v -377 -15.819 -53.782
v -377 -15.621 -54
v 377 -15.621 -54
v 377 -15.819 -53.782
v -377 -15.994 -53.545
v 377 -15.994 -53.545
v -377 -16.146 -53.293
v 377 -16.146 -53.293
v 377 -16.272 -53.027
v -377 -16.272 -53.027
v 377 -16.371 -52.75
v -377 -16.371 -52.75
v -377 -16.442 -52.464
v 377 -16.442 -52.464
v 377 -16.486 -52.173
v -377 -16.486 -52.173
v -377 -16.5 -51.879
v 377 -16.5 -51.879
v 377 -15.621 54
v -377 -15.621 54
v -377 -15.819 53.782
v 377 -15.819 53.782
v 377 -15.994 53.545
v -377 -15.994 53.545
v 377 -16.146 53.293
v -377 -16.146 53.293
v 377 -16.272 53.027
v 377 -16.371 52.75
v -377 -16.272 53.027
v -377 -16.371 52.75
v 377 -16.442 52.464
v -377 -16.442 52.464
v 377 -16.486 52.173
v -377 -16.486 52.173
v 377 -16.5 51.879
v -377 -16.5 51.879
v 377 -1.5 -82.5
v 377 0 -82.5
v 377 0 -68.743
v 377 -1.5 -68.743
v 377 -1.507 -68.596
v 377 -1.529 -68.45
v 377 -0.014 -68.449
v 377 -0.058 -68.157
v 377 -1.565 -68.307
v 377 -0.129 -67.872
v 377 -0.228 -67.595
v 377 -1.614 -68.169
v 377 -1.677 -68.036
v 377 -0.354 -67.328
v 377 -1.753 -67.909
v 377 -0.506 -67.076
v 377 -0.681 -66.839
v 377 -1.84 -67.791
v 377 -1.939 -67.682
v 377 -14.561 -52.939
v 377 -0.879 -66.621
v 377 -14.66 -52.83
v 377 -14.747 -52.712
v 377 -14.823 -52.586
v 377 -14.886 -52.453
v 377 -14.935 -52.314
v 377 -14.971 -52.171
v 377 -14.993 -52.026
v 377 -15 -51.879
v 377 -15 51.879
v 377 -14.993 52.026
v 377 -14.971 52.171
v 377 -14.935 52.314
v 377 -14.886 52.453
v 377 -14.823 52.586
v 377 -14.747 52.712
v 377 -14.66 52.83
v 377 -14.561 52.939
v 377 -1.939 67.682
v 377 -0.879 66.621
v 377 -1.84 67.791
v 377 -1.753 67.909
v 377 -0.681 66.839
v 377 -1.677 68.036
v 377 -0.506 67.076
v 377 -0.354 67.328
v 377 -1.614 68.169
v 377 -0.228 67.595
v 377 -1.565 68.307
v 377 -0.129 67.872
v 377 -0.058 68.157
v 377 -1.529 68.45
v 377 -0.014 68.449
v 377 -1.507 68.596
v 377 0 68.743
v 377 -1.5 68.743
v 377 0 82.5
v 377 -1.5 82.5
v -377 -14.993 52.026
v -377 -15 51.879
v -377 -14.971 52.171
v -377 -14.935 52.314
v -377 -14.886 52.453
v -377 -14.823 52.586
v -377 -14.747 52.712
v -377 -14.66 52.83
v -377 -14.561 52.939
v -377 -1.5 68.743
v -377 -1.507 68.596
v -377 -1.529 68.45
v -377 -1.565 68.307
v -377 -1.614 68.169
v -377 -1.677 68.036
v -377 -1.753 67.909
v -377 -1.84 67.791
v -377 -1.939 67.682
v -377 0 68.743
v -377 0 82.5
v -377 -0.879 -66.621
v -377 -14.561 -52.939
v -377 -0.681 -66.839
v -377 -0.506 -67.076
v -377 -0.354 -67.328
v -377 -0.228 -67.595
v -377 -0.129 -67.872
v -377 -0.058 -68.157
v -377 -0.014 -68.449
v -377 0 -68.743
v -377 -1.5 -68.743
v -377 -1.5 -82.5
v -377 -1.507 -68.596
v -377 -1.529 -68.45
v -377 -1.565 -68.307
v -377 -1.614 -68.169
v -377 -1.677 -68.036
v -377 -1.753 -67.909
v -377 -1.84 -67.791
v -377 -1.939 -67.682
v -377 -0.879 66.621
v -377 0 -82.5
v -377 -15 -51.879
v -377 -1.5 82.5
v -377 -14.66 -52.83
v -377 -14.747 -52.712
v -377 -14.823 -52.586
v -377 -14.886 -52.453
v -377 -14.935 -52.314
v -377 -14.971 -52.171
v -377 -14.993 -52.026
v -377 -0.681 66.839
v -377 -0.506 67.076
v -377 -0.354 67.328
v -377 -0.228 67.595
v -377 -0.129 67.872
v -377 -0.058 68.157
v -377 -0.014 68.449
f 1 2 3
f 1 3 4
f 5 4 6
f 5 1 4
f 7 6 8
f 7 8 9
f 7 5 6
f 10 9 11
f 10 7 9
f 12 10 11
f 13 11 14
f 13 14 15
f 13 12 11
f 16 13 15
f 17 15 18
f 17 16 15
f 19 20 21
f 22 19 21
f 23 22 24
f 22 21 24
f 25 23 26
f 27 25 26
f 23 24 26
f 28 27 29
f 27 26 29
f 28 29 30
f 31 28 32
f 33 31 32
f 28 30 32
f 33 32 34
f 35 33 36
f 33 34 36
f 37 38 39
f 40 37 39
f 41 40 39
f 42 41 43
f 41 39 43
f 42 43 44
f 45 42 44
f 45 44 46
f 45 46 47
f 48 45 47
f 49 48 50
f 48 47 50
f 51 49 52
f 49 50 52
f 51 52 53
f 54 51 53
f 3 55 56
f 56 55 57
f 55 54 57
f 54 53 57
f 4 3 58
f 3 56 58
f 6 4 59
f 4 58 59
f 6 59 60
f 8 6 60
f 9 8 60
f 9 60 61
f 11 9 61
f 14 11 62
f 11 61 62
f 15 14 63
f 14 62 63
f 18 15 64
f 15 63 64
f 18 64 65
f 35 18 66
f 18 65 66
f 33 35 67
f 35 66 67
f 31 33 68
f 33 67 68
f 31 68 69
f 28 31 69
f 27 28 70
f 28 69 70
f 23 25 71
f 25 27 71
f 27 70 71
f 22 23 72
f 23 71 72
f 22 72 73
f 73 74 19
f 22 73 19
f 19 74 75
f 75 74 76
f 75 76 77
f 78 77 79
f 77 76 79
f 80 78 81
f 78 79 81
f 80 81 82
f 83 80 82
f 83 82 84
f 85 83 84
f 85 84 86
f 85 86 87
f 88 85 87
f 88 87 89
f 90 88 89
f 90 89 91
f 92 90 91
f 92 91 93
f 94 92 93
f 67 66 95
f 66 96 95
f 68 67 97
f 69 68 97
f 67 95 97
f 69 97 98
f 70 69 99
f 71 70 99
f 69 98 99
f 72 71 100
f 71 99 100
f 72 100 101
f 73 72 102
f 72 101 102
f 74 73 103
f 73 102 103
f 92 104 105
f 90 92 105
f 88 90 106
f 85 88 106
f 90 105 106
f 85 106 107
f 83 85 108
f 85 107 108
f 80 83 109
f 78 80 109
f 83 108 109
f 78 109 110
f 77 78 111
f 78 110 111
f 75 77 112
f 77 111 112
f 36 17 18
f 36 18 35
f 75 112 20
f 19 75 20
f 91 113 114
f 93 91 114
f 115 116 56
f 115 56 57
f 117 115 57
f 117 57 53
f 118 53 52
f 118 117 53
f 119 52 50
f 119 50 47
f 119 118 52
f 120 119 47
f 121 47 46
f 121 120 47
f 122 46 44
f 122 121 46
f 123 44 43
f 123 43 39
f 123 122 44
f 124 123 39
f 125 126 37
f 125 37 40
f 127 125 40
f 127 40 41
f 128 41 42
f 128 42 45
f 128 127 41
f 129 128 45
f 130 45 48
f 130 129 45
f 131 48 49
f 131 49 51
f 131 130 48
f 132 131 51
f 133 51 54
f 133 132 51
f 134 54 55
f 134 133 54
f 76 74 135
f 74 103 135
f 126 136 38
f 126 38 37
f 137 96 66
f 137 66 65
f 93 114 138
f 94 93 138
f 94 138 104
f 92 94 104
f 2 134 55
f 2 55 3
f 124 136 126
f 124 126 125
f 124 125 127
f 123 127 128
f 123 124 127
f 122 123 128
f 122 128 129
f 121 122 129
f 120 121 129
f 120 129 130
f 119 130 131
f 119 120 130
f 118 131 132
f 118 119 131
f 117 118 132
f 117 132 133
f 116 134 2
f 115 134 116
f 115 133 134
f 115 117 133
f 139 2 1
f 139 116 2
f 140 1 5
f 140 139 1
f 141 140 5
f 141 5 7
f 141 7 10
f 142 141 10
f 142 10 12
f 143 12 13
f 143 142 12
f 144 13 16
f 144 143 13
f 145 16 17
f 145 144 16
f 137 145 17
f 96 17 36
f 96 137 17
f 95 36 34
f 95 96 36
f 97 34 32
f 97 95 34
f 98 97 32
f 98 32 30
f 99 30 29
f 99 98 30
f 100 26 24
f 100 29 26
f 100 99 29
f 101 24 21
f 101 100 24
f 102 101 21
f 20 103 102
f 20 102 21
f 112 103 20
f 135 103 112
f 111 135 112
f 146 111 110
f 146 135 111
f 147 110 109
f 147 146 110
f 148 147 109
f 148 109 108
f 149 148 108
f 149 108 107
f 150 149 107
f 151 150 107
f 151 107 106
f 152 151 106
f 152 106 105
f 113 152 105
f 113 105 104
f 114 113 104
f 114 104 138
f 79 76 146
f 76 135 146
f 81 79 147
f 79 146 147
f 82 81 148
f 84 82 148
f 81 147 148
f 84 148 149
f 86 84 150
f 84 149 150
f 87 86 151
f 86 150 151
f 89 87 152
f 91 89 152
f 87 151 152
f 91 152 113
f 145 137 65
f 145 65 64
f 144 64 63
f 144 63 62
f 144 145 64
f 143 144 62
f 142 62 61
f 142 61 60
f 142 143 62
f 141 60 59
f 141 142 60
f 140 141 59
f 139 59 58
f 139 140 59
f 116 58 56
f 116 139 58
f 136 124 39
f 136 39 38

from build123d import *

# Parameters (mm, degrees)
SM_BASE_FLANGE_1_DEPTH = 377


# Sheet-metal steps are written as plain solids
with BuildPart() as part:
    # Sketch 1 → Базовая кромка1 (new body)
    with BuildSketch(Plane(origin=(0, 0, 0), x_dir=(0, 0, -1), z_dir=(1, 0, 0))):
        with BuildLine():
            Line((0, -15), (-51.878679656, -15))
            ThreePointArc((-51.878679656, -15), (-52.452704805, -14.885819299), (-52.939339828, -14.560660172))
            Line((-52.939339828, -14.560660172), (-66.621320344, -0.878679656))
            ThreePointArc((-66.621320344, -0.878679656), (-67.59459039, -0.228361402), (-68.742640687, 0))
            Line((-68.742640687, 0), (-82.5, 0))
            Line((-82.5, 0), (-82.5, -1.5))
            Line((-82.5, -1.5), (-68.742640687, -1.5))
            ThreePointArc((-68.742640687, -1.5), (-68.168615539, -1.614180701), (-67.681980515, -1.939339828))
            Line((-67.681980515, -1.939339828), (-54, -15.621320344))
            ThreePointArc((-54, -15.621320344), (-53.026729954, -16.271638598), (-51.878679656, -16.5))
            Line((-51.878679656, -16.5), (0, -16.5))
            Line((0, -16.5), (0, -15))
        make_face()
    extrude(amount=-SM_BASE_FLANGE_1_DEPTH)

    # Зеркальное отражение1: part across plane


with BuildPart() as part_1:
    add(part.part)
    add(part.part.mirror(Plane(origin=(-494.133821974, -15, 0), x_dir=(1, 0, 0), z_dir=(0, 0, 1))))

    # Зеркальное отражение2: part across plane


with BuildPart() as part_2:
    add(part_1.part)
    add(part_1.part.mirror(Plane(origin=(0, -15.621320344, 54), x_dir=(0, 0, 1), z_dir=(1, 0, 0))))


solid = part_2.part
